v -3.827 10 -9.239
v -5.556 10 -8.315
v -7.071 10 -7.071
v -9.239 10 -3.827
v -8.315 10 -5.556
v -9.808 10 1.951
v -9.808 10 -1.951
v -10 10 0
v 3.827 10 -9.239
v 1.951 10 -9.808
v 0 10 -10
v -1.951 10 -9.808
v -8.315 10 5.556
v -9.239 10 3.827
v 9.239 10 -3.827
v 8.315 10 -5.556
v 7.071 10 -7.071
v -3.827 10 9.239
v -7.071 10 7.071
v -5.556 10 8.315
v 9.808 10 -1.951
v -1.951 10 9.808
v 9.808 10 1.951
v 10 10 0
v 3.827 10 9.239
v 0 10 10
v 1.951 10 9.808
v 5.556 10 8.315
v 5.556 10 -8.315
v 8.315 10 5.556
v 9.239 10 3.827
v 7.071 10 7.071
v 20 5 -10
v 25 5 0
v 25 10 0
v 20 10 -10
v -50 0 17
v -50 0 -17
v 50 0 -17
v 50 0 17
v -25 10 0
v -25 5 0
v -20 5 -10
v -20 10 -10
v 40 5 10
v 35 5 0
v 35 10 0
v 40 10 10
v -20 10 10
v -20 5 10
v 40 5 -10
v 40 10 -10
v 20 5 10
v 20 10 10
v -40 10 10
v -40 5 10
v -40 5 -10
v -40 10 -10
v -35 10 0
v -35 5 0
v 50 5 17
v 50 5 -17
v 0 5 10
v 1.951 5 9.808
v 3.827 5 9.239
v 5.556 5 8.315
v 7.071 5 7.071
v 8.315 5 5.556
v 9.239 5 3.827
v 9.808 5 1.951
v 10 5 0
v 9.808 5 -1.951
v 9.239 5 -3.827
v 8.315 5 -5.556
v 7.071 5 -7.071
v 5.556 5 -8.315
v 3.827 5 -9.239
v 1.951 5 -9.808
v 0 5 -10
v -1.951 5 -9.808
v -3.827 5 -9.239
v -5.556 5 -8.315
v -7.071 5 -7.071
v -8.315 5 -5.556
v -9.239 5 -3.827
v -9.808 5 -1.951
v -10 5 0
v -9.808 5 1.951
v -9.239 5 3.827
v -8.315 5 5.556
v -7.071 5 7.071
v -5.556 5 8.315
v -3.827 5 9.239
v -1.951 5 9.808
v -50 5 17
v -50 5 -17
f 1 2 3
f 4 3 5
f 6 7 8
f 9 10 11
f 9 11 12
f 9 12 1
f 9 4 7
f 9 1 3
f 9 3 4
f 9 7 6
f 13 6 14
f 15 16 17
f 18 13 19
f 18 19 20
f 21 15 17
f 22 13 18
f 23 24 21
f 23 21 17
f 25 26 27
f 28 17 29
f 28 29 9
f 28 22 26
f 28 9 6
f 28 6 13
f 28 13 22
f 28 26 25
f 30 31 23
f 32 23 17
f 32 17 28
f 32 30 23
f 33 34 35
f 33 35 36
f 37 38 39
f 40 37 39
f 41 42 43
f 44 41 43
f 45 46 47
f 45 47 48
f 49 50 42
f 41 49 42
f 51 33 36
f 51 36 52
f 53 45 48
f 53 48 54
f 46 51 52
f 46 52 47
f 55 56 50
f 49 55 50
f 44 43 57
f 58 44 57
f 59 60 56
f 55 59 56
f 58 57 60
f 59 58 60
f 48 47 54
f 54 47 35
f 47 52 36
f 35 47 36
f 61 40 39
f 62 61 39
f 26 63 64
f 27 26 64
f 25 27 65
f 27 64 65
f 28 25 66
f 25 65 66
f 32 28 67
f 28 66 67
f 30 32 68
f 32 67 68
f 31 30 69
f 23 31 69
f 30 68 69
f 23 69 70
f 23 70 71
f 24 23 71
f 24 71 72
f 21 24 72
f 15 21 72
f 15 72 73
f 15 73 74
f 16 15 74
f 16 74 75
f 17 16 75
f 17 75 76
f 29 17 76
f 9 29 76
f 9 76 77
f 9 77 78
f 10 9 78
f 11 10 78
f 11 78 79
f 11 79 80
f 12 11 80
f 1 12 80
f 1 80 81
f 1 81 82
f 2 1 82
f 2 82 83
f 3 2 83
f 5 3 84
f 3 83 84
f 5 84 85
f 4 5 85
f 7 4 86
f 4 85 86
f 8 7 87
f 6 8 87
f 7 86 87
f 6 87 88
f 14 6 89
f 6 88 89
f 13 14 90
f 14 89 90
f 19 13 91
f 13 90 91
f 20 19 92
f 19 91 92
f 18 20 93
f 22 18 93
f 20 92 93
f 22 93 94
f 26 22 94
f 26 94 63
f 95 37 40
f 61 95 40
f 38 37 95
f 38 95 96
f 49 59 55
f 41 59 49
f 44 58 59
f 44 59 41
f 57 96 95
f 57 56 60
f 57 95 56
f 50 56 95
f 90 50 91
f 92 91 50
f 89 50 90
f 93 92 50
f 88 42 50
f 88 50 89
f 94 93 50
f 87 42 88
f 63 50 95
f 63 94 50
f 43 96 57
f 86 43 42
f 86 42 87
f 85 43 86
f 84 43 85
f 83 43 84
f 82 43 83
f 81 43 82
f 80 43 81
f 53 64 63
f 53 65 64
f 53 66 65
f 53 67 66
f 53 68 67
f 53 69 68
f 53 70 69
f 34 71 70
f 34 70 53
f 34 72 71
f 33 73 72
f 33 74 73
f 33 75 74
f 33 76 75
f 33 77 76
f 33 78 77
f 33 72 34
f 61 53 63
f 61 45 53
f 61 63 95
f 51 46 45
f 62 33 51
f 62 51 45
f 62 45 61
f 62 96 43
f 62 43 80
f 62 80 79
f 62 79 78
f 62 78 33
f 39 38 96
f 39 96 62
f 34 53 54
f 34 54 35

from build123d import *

# Parameters (mm, degrees)
SKETCH_1_W      = 100
SKETCH_1_H      = 34
SKETCH_1_R      = 10
EXTRUDE_1_DEPTH = 5
SKETCH_1_2_R    = 10
EXTRUDE_2_DEPTH = 10


with BuildPart() as part:
    # 草图1 → 凸台-拉伸1 (new body)
    with BuildSketch(Plane(origin=(0, 0, 0), x_dir=(1, 0, 0), z_dir=(0, 1, 0))):
        Rectangle(SKETCH_1_W, SKETCH_1_H)
        Circle(SKETCH_1_R, mode=Mode.SUBTRACT)
        Polygon((-40, 10), (-20, 10), (-25, 0), (-20, -10), (-40, -10), (-35, 0), align=None, mode=Mode.SUBTRACT)
        Polygon((40, 10), (20, 10), (25, 0), (20, -10), (40, -10), (35, 0), align=None, mode=Mode.SUBTRACT)
    extrude(amount=EXTRUDE_1_DEPTH)

    # 草图1<2> → 凸台-拉伸2 (add)
    with BuildSketch(Plane(origin=(0, 0, 0), x_dir=(1, 0, 0), z_dir=(0, 1, 0))):
        Polygon((-20, 10), (-40, 10), (-35, 0), (-40, -10), (-20, -10), (-25, 0), align=None)
        Polygon((35, 0), (40, 10), (20, 10), (25, 0), (20, -10), (40, -10), align=None)
        Circle(SKETCH_1_2_R)
    extrude(amount=EXTRUDE_2_DEPTH)


solid = part.part
